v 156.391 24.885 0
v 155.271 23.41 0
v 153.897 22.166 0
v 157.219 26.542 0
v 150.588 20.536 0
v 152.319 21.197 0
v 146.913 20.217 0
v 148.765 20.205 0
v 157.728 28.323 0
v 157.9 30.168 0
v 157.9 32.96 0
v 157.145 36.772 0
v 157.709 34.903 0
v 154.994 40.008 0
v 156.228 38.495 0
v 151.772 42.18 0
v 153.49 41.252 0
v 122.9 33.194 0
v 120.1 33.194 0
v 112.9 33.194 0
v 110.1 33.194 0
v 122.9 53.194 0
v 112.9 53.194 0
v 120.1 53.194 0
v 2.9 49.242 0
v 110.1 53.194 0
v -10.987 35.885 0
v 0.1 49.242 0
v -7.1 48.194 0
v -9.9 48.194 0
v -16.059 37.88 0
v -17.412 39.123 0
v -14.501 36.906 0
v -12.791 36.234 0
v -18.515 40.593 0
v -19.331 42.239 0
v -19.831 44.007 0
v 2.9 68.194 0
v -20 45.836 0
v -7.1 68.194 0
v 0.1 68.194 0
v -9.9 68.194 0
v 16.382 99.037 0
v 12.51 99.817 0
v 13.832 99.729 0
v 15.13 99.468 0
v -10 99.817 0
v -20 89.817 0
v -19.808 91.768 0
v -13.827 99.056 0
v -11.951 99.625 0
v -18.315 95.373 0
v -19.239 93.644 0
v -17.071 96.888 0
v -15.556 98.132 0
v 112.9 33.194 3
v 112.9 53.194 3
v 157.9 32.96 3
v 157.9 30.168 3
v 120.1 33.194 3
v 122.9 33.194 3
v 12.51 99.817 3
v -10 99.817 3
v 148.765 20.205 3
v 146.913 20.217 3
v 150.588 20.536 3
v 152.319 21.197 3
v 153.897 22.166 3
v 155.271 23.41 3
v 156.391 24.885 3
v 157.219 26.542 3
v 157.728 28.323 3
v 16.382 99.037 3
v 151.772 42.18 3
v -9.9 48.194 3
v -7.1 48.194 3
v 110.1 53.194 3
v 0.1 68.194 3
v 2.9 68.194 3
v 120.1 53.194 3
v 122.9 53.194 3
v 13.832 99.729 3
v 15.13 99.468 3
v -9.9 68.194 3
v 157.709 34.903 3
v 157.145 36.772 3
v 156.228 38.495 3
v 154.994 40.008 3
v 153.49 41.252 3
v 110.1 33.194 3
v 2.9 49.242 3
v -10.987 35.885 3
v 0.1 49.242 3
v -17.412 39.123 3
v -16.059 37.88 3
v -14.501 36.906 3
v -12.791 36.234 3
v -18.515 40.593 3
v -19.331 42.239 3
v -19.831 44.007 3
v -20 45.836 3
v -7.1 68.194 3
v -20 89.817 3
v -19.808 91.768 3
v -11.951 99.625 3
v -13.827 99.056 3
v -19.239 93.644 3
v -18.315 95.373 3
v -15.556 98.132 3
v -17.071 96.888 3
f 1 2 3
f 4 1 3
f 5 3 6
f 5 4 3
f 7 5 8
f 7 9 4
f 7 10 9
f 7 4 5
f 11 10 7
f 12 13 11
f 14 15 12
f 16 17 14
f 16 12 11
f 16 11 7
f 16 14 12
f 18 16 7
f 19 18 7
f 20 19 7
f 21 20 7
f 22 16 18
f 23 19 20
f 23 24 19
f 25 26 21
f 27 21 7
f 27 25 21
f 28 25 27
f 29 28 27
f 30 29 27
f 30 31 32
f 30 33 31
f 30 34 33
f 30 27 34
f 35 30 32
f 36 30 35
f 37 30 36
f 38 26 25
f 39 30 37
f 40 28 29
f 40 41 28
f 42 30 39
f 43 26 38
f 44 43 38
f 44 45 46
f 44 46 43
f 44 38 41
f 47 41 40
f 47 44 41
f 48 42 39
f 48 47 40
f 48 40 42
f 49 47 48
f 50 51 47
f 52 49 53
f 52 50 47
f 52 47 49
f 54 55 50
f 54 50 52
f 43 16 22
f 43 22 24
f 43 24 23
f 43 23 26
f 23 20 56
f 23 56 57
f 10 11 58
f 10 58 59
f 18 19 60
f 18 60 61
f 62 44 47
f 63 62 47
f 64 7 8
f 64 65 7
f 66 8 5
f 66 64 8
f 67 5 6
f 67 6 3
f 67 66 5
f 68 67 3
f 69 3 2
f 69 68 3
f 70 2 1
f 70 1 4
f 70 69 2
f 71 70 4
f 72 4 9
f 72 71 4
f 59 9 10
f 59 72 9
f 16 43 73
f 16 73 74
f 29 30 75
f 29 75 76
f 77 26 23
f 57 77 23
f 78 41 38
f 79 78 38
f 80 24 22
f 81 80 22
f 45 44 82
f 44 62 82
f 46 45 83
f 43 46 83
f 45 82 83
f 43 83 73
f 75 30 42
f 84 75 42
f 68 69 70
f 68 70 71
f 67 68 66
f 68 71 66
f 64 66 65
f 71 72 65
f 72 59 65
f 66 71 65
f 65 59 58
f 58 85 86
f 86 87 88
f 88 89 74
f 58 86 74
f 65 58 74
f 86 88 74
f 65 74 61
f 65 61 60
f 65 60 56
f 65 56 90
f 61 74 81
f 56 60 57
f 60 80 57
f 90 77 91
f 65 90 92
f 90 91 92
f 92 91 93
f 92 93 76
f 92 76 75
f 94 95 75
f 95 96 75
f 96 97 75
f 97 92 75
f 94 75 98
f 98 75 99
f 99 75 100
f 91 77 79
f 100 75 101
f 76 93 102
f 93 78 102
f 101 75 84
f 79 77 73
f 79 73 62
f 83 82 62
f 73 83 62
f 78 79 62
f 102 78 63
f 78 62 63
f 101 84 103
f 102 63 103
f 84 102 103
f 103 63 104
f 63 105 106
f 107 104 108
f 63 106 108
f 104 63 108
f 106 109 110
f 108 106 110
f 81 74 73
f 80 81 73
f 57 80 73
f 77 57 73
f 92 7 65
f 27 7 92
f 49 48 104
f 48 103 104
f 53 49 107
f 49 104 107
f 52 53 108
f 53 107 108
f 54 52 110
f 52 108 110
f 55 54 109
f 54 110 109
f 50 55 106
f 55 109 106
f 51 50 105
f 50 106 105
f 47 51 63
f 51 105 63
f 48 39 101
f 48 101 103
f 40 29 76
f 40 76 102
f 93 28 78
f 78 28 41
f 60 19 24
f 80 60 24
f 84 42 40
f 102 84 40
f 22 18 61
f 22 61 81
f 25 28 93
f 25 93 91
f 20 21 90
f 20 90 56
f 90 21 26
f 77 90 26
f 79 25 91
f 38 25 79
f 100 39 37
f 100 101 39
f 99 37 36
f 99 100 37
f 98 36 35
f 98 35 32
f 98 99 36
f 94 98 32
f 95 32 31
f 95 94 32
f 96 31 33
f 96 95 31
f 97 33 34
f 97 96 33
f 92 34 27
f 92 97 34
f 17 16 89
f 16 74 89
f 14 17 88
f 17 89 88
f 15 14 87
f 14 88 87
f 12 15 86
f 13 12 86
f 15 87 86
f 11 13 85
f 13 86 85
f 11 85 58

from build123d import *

# Parameters (mm, degrees)
SKETCH2_W           = 2.8
SKETCH2_H           = 20
SKETCH2_H_2         = 20.000000002
SKETCH2_H_3         = 18.952705736
BOSS_EXTRUDE1_DEPTH = 3
FILLET1_R           = 10
SKETCH3_W           = 34.524922621
SKETCH3_H           = 4
CUT_EXTRUDE1_DEPTH  = 10
FILLET2_R           = 10


with BuildPart() as part:
    # Sketch2 → Boss-Extrude1 (new body)
    with BuildSketch(Plane.XY):
        Polygon((-20, 103.817072851), (5, 103.817072851), (157.9, 39.606577468), (157.9, 19.126615409), (-20, 36.779238836), align=None)
        with Locations((111.5, 43.194495368)):
            Rectangle(SKETCH2_W, SKETCH2_H, mode=Mode.SUBTRACT)
        with Locations((121.5, 43.194495368)):
            Rectangle(SKETCH2_W, SKETCH2_H, mode=Mode.SUBTRACT)
        with Locations((-8.5, 58.194495367)):
            Rectangle(SKETCH2_W, SKETCH2_H_2, mode=Mode.SUBTRACT)
        with Locations((1.5, 58.7181425)):
            Rectangle(SKETCH2_W, SKETCH2_H_3, mode=Mode.SUBTRACT)
    extrude(amount=BOSS_EXTRUDE1_DEPTH)

    # Fillet1
    fillet1_edges = [part.edges().sort_by_distance(p)[0] for p in [
        (157.9, 39.606577468, 1.5),
        (157.9, 19.126615409, 1.5),
        (-20, 36.779238836, 1.5),
    ]]
    fillet(fillet1_edges, radius=FILLET1_R)

    # Sketch3 → Cut-Extrude1 (cut)
    with BuildSketch(Plane(origin=(0, 0, 0), x_dir=(-1, 0, 0), z_dir=(0, 0, -1))):
        with Locations((2.737538689, 101.817072851)):
            Rectangle(SKETCH3_W, SKETCH3_H)
    extrude(amount=-CUT_EXTRUDE1_DEPTH, mode=Mode.SUBTRACT)

    # Fillet2
    fillet2_edges = [part.edges().sort_by_distance(p)[0] for p in [
        (14.524922621, 99.817072851, 1.5),
        (-20, 99.817072851, 1.5),
    ]]
    fillet(fillet2_edges, radius=FILLET2_R)


solid = part.part
